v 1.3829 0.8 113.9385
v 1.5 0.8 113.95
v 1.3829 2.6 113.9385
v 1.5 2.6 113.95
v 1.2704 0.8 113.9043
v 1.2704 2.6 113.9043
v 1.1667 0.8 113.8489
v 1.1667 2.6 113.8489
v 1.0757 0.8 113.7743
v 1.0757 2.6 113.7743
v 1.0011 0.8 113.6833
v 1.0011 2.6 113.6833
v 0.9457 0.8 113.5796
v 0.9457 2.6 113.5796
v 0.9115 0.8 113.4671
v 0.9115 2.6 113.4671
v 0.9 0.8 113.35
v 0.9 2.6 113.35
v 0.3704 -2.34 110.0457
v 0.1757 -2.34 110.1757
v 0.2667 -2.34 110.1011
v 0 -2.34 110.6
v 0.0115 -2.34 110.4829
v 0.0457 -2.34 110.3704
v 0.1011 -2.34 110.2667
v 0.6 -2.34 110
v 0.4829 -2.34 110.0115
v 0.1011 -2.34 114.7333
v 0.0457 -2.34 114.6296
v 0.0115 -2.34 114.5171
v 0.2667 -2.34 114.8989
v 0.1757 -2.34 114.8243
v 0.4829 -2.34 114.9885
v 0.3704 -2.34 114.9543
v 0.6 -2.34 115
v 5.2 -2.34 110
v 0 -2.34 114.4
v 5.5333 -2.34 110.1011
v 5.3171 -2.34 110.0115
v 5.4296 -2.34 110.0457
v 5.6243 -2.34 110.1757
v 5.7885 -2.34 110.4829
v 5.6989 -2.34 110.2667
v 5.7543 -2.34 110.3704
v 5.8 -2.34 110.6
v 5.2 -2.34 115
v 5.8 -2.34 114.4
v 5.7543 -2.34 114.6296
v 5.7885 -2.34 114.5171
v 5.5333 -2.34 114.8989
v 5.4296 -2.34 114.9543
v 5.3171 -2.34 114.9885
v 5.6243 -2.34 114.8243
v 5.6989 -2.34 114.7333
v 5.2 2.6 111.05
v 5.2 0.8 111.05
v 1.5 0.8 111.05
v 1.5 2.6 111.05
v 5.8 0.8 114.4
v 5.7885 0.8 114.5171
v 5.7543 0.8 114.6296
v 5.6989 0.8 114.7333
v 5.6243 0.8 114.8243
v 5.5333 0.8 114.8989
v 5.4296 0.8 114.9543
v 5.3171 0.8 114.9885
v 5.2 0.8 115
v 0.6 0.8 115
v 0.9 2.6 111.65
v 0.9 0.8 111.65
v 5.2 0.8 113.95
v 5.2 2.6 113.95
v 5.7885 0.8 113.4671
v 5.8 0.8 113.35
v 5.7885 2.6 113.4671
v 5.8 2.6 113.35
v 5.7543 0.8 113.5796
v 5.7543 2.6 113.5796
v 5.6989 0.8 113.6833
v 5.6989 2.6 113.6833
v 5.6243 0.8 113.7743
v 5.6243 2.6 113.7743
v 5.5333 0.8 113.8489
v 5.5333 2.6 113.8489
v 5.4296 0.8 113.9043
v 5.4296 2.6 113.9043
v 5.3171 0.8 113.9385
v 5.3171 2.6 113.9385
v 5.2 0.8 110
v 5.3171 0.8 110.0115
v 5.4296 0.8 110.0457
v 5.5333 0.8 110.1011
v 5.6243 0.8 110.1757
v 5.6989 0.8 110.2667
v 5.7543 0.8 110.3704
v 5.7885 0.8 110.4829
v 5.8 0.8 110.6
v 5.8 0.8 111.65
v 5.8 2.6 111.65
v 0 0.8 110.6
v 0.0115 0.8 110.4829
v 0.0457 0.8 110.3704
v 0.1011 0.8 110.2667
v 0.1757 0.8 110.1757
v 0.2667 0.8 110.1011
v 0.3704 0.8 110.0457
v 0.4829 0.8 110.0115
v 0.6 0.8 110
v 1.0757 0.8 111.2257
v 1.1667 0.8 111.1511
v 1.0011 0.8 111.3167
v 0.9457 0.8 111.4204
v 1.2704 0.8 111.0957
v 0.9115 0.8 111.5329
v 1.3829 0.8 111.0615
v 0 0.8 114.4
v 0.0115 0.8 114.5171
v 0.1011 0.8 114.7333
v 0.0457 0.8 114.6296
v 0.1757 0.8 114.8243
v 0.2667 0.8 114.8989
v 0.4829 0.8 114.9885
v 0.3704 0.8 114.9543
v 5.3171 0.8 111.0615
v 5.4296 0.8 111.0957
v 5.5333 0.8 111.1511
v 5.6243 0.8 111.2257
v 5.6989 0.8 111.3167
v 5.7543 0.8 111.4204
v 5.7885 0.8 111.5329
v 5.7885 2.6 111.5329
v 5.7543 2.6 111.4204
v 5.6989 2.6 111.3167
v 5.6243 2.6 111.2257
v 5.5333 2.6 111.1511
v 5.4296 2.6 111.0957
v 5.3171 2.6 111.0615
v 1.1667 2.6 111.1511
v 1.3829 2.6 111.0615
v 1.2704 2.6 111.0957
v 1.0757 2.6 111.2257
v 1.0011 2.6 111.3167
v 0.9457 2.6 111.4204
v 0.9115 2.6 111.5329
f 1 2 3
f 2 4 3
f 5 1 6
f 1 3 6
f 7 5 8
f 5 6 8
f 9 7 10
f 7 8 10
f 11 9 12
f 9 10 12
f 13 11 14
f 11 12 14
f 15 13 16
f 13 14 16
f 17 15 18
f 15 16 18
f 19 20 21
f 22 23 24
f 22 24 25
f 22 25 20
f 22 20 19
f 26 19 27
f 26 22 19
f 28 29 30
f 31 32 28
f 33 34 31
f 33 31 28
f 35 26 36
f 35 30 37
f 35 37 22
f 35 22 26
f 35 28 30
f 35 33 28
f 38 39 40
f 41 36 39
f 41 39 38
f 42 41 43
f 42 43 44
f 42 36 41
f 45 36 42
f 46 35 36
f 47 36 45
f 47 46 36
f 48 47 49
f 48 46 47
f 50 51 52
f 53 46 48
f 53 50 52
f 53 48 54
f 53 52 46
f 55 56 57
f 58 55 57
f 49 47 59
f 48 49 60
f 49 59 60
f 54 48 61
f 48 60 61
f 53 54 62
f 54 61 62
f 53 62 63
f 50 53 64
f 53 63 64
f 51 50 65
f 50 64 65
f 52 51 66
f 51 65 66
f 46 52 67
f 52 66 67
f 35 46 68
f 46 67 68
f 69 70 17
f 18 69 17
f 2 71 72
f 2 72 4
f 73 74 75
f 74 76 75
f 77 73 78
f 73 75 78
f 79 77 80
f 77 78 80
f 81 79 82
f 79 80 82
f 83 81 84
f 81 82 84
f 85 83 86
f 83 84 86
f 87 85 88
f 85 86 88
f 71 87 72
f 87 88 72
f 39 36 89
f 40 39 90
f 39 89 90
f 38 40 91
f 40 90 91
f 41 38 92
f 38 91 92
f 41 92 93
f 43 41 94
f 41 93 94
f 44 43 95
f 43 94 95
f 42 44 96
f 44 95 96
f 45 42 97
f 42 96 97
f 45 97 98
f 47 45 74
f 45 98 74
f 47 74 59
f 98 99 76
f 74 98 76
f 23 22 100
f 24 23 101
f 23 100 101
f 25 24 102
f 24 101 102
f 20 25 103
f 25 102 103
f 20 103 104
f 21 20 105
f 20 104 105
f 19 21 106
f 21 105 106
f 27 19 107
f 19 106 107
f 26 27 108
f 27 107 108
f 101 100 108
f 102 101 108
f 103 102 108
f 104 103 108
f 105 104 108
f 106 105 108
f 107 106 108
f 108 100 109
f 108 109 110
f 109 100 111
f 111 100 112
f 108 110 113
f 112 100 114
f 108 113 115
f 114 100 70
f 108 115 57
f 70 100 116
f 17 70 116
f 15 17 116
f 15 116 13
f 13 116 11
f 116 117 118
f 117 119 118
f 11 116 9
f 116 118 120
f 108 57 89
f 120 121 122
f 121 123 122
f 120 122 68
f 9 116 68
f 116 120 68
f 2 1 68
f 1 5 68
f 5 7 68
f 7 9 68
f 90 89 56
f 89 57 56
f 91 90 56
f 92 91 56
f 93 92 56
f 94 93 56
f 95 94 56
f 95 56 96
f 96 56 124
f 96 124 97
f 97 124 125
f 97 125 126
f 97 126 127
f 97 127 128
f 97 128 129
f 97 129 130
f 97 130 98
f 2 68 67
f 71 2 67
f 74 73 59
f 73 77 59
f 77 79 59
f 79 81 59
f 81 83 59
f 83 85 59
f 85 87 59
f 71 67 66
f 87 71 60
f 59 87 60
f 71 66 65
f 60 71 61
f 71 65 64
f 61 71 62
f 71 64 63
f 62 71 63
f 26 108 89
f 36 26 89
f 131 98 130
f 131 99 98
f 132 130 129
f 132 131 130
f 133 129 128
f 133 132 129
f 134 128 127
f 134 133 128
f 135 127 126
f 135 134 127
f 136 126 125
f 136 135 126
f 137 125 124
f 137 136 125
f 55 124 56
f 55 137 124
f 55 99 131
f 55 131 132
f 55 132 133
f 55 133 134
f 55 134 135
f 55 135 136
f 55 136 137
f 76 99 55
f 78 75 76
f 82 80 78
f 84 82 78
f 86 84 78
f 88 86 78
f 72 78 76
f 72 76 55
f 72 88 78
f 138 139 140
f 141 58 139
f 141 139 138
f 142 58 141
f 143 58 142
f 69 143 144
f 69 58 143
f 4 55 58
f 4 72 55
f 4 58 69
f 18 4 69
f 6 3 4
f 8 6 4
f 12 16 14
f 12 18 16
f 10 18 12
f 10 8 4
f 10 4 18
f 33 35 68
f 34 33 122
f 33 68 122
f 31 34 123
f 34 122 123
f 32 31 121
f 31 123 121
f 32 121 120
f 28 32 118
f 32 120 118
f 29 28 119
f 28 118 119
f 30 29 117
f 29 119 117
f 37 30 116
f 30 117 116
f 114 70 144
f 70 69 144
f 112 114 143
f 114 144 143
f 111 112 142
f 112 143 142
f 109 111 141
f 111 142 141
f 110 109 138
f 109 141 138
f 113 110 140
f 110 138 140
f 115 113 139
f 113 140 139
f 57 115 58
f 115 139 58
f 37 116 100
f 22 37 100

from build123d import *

# Parameters (mm, degrees)
SKETCH1_W           = 5.8
SKETCH1_H           = 5
BOSS_EXTRUDE1_DEPTH = 0.8
SKETCH2_W           = 4.9
SKETCH2_H           = 2.9
BOSS_EXTRUDE2_DEPTH = 1.8
FILLET1_R           = 0.6
BOSS_EXTRUDE3_DEPTH = 2.34


with BuildPart() as part:
    # Sketch1 → Boss-Extrude1 (new body)
    with BuildSketch(Plane.XZ):
        with Locations((2.9, 112.5)):
            Rectangle(SKETCH1_W, SKETCH1_H)
    extrude(amount=-BOSS_EXTRUDE1_DEPTH)

    # Sketch2 → Boss-Extrude2 (add)
    with BuildSketch(Plane(origin=(0, 0.8, 0), x_dir=(-1, 0, 0), z_dir=(0, 1, 0))):
        with Locations((-3.35, 112.5)):
            Rectangle(SKETCH2_W, SKETCH2_H)
    extrude(amount=BOSS_EXTRUDE2_DEPTH)

    # Fillet1
    fillet1_edges = [part.edges().sort_by_distance(p)[0] for p in [
        (5.8, 1.7, 113.95),
        (5.8, 1.7, 111.05),
        (0.9, 1.7, 111.05),
        (0.9, 1.7, 113.95),
        (0, 0.4, 115),
        (5.8, 0.4, 115),
        (5.8, 0.4, 110),
        (0, 0.4, 110),
    ]]
    fillet(fillet1_edges, radius=FILLET1_R)

    # Sketch3 → Boss-Extrude3 (add)
    with BuildSketch(Plane.XZ):
        with BuildLine():
            Line((0.6, 110), (5.2, 110))
            ThreePointArc((5.2, 110), (5.624264069, 110.175735931), (5.8, 110.6))
            Line((5.8, 110.6), (5.8, 114.4))
            ThreePointArc((5.8, 114.4), (5.624264069, 114.824264069), (5.2, 115))
            Line((5.2, 115), (0.6, 115))
            ThreePointArc((0.6, 115), (0.175735931, 114.824264069), (0, 114.4))
            Line((0, 114.4), (0, 110.6))
            ThreePointArc((0, 110.6), (0.175735931, 110.175735931), (0.6, 110))
        make_face()
    extrude(amount=BOSS_EXTRUDE3_DEPTH)


solid = part.part
